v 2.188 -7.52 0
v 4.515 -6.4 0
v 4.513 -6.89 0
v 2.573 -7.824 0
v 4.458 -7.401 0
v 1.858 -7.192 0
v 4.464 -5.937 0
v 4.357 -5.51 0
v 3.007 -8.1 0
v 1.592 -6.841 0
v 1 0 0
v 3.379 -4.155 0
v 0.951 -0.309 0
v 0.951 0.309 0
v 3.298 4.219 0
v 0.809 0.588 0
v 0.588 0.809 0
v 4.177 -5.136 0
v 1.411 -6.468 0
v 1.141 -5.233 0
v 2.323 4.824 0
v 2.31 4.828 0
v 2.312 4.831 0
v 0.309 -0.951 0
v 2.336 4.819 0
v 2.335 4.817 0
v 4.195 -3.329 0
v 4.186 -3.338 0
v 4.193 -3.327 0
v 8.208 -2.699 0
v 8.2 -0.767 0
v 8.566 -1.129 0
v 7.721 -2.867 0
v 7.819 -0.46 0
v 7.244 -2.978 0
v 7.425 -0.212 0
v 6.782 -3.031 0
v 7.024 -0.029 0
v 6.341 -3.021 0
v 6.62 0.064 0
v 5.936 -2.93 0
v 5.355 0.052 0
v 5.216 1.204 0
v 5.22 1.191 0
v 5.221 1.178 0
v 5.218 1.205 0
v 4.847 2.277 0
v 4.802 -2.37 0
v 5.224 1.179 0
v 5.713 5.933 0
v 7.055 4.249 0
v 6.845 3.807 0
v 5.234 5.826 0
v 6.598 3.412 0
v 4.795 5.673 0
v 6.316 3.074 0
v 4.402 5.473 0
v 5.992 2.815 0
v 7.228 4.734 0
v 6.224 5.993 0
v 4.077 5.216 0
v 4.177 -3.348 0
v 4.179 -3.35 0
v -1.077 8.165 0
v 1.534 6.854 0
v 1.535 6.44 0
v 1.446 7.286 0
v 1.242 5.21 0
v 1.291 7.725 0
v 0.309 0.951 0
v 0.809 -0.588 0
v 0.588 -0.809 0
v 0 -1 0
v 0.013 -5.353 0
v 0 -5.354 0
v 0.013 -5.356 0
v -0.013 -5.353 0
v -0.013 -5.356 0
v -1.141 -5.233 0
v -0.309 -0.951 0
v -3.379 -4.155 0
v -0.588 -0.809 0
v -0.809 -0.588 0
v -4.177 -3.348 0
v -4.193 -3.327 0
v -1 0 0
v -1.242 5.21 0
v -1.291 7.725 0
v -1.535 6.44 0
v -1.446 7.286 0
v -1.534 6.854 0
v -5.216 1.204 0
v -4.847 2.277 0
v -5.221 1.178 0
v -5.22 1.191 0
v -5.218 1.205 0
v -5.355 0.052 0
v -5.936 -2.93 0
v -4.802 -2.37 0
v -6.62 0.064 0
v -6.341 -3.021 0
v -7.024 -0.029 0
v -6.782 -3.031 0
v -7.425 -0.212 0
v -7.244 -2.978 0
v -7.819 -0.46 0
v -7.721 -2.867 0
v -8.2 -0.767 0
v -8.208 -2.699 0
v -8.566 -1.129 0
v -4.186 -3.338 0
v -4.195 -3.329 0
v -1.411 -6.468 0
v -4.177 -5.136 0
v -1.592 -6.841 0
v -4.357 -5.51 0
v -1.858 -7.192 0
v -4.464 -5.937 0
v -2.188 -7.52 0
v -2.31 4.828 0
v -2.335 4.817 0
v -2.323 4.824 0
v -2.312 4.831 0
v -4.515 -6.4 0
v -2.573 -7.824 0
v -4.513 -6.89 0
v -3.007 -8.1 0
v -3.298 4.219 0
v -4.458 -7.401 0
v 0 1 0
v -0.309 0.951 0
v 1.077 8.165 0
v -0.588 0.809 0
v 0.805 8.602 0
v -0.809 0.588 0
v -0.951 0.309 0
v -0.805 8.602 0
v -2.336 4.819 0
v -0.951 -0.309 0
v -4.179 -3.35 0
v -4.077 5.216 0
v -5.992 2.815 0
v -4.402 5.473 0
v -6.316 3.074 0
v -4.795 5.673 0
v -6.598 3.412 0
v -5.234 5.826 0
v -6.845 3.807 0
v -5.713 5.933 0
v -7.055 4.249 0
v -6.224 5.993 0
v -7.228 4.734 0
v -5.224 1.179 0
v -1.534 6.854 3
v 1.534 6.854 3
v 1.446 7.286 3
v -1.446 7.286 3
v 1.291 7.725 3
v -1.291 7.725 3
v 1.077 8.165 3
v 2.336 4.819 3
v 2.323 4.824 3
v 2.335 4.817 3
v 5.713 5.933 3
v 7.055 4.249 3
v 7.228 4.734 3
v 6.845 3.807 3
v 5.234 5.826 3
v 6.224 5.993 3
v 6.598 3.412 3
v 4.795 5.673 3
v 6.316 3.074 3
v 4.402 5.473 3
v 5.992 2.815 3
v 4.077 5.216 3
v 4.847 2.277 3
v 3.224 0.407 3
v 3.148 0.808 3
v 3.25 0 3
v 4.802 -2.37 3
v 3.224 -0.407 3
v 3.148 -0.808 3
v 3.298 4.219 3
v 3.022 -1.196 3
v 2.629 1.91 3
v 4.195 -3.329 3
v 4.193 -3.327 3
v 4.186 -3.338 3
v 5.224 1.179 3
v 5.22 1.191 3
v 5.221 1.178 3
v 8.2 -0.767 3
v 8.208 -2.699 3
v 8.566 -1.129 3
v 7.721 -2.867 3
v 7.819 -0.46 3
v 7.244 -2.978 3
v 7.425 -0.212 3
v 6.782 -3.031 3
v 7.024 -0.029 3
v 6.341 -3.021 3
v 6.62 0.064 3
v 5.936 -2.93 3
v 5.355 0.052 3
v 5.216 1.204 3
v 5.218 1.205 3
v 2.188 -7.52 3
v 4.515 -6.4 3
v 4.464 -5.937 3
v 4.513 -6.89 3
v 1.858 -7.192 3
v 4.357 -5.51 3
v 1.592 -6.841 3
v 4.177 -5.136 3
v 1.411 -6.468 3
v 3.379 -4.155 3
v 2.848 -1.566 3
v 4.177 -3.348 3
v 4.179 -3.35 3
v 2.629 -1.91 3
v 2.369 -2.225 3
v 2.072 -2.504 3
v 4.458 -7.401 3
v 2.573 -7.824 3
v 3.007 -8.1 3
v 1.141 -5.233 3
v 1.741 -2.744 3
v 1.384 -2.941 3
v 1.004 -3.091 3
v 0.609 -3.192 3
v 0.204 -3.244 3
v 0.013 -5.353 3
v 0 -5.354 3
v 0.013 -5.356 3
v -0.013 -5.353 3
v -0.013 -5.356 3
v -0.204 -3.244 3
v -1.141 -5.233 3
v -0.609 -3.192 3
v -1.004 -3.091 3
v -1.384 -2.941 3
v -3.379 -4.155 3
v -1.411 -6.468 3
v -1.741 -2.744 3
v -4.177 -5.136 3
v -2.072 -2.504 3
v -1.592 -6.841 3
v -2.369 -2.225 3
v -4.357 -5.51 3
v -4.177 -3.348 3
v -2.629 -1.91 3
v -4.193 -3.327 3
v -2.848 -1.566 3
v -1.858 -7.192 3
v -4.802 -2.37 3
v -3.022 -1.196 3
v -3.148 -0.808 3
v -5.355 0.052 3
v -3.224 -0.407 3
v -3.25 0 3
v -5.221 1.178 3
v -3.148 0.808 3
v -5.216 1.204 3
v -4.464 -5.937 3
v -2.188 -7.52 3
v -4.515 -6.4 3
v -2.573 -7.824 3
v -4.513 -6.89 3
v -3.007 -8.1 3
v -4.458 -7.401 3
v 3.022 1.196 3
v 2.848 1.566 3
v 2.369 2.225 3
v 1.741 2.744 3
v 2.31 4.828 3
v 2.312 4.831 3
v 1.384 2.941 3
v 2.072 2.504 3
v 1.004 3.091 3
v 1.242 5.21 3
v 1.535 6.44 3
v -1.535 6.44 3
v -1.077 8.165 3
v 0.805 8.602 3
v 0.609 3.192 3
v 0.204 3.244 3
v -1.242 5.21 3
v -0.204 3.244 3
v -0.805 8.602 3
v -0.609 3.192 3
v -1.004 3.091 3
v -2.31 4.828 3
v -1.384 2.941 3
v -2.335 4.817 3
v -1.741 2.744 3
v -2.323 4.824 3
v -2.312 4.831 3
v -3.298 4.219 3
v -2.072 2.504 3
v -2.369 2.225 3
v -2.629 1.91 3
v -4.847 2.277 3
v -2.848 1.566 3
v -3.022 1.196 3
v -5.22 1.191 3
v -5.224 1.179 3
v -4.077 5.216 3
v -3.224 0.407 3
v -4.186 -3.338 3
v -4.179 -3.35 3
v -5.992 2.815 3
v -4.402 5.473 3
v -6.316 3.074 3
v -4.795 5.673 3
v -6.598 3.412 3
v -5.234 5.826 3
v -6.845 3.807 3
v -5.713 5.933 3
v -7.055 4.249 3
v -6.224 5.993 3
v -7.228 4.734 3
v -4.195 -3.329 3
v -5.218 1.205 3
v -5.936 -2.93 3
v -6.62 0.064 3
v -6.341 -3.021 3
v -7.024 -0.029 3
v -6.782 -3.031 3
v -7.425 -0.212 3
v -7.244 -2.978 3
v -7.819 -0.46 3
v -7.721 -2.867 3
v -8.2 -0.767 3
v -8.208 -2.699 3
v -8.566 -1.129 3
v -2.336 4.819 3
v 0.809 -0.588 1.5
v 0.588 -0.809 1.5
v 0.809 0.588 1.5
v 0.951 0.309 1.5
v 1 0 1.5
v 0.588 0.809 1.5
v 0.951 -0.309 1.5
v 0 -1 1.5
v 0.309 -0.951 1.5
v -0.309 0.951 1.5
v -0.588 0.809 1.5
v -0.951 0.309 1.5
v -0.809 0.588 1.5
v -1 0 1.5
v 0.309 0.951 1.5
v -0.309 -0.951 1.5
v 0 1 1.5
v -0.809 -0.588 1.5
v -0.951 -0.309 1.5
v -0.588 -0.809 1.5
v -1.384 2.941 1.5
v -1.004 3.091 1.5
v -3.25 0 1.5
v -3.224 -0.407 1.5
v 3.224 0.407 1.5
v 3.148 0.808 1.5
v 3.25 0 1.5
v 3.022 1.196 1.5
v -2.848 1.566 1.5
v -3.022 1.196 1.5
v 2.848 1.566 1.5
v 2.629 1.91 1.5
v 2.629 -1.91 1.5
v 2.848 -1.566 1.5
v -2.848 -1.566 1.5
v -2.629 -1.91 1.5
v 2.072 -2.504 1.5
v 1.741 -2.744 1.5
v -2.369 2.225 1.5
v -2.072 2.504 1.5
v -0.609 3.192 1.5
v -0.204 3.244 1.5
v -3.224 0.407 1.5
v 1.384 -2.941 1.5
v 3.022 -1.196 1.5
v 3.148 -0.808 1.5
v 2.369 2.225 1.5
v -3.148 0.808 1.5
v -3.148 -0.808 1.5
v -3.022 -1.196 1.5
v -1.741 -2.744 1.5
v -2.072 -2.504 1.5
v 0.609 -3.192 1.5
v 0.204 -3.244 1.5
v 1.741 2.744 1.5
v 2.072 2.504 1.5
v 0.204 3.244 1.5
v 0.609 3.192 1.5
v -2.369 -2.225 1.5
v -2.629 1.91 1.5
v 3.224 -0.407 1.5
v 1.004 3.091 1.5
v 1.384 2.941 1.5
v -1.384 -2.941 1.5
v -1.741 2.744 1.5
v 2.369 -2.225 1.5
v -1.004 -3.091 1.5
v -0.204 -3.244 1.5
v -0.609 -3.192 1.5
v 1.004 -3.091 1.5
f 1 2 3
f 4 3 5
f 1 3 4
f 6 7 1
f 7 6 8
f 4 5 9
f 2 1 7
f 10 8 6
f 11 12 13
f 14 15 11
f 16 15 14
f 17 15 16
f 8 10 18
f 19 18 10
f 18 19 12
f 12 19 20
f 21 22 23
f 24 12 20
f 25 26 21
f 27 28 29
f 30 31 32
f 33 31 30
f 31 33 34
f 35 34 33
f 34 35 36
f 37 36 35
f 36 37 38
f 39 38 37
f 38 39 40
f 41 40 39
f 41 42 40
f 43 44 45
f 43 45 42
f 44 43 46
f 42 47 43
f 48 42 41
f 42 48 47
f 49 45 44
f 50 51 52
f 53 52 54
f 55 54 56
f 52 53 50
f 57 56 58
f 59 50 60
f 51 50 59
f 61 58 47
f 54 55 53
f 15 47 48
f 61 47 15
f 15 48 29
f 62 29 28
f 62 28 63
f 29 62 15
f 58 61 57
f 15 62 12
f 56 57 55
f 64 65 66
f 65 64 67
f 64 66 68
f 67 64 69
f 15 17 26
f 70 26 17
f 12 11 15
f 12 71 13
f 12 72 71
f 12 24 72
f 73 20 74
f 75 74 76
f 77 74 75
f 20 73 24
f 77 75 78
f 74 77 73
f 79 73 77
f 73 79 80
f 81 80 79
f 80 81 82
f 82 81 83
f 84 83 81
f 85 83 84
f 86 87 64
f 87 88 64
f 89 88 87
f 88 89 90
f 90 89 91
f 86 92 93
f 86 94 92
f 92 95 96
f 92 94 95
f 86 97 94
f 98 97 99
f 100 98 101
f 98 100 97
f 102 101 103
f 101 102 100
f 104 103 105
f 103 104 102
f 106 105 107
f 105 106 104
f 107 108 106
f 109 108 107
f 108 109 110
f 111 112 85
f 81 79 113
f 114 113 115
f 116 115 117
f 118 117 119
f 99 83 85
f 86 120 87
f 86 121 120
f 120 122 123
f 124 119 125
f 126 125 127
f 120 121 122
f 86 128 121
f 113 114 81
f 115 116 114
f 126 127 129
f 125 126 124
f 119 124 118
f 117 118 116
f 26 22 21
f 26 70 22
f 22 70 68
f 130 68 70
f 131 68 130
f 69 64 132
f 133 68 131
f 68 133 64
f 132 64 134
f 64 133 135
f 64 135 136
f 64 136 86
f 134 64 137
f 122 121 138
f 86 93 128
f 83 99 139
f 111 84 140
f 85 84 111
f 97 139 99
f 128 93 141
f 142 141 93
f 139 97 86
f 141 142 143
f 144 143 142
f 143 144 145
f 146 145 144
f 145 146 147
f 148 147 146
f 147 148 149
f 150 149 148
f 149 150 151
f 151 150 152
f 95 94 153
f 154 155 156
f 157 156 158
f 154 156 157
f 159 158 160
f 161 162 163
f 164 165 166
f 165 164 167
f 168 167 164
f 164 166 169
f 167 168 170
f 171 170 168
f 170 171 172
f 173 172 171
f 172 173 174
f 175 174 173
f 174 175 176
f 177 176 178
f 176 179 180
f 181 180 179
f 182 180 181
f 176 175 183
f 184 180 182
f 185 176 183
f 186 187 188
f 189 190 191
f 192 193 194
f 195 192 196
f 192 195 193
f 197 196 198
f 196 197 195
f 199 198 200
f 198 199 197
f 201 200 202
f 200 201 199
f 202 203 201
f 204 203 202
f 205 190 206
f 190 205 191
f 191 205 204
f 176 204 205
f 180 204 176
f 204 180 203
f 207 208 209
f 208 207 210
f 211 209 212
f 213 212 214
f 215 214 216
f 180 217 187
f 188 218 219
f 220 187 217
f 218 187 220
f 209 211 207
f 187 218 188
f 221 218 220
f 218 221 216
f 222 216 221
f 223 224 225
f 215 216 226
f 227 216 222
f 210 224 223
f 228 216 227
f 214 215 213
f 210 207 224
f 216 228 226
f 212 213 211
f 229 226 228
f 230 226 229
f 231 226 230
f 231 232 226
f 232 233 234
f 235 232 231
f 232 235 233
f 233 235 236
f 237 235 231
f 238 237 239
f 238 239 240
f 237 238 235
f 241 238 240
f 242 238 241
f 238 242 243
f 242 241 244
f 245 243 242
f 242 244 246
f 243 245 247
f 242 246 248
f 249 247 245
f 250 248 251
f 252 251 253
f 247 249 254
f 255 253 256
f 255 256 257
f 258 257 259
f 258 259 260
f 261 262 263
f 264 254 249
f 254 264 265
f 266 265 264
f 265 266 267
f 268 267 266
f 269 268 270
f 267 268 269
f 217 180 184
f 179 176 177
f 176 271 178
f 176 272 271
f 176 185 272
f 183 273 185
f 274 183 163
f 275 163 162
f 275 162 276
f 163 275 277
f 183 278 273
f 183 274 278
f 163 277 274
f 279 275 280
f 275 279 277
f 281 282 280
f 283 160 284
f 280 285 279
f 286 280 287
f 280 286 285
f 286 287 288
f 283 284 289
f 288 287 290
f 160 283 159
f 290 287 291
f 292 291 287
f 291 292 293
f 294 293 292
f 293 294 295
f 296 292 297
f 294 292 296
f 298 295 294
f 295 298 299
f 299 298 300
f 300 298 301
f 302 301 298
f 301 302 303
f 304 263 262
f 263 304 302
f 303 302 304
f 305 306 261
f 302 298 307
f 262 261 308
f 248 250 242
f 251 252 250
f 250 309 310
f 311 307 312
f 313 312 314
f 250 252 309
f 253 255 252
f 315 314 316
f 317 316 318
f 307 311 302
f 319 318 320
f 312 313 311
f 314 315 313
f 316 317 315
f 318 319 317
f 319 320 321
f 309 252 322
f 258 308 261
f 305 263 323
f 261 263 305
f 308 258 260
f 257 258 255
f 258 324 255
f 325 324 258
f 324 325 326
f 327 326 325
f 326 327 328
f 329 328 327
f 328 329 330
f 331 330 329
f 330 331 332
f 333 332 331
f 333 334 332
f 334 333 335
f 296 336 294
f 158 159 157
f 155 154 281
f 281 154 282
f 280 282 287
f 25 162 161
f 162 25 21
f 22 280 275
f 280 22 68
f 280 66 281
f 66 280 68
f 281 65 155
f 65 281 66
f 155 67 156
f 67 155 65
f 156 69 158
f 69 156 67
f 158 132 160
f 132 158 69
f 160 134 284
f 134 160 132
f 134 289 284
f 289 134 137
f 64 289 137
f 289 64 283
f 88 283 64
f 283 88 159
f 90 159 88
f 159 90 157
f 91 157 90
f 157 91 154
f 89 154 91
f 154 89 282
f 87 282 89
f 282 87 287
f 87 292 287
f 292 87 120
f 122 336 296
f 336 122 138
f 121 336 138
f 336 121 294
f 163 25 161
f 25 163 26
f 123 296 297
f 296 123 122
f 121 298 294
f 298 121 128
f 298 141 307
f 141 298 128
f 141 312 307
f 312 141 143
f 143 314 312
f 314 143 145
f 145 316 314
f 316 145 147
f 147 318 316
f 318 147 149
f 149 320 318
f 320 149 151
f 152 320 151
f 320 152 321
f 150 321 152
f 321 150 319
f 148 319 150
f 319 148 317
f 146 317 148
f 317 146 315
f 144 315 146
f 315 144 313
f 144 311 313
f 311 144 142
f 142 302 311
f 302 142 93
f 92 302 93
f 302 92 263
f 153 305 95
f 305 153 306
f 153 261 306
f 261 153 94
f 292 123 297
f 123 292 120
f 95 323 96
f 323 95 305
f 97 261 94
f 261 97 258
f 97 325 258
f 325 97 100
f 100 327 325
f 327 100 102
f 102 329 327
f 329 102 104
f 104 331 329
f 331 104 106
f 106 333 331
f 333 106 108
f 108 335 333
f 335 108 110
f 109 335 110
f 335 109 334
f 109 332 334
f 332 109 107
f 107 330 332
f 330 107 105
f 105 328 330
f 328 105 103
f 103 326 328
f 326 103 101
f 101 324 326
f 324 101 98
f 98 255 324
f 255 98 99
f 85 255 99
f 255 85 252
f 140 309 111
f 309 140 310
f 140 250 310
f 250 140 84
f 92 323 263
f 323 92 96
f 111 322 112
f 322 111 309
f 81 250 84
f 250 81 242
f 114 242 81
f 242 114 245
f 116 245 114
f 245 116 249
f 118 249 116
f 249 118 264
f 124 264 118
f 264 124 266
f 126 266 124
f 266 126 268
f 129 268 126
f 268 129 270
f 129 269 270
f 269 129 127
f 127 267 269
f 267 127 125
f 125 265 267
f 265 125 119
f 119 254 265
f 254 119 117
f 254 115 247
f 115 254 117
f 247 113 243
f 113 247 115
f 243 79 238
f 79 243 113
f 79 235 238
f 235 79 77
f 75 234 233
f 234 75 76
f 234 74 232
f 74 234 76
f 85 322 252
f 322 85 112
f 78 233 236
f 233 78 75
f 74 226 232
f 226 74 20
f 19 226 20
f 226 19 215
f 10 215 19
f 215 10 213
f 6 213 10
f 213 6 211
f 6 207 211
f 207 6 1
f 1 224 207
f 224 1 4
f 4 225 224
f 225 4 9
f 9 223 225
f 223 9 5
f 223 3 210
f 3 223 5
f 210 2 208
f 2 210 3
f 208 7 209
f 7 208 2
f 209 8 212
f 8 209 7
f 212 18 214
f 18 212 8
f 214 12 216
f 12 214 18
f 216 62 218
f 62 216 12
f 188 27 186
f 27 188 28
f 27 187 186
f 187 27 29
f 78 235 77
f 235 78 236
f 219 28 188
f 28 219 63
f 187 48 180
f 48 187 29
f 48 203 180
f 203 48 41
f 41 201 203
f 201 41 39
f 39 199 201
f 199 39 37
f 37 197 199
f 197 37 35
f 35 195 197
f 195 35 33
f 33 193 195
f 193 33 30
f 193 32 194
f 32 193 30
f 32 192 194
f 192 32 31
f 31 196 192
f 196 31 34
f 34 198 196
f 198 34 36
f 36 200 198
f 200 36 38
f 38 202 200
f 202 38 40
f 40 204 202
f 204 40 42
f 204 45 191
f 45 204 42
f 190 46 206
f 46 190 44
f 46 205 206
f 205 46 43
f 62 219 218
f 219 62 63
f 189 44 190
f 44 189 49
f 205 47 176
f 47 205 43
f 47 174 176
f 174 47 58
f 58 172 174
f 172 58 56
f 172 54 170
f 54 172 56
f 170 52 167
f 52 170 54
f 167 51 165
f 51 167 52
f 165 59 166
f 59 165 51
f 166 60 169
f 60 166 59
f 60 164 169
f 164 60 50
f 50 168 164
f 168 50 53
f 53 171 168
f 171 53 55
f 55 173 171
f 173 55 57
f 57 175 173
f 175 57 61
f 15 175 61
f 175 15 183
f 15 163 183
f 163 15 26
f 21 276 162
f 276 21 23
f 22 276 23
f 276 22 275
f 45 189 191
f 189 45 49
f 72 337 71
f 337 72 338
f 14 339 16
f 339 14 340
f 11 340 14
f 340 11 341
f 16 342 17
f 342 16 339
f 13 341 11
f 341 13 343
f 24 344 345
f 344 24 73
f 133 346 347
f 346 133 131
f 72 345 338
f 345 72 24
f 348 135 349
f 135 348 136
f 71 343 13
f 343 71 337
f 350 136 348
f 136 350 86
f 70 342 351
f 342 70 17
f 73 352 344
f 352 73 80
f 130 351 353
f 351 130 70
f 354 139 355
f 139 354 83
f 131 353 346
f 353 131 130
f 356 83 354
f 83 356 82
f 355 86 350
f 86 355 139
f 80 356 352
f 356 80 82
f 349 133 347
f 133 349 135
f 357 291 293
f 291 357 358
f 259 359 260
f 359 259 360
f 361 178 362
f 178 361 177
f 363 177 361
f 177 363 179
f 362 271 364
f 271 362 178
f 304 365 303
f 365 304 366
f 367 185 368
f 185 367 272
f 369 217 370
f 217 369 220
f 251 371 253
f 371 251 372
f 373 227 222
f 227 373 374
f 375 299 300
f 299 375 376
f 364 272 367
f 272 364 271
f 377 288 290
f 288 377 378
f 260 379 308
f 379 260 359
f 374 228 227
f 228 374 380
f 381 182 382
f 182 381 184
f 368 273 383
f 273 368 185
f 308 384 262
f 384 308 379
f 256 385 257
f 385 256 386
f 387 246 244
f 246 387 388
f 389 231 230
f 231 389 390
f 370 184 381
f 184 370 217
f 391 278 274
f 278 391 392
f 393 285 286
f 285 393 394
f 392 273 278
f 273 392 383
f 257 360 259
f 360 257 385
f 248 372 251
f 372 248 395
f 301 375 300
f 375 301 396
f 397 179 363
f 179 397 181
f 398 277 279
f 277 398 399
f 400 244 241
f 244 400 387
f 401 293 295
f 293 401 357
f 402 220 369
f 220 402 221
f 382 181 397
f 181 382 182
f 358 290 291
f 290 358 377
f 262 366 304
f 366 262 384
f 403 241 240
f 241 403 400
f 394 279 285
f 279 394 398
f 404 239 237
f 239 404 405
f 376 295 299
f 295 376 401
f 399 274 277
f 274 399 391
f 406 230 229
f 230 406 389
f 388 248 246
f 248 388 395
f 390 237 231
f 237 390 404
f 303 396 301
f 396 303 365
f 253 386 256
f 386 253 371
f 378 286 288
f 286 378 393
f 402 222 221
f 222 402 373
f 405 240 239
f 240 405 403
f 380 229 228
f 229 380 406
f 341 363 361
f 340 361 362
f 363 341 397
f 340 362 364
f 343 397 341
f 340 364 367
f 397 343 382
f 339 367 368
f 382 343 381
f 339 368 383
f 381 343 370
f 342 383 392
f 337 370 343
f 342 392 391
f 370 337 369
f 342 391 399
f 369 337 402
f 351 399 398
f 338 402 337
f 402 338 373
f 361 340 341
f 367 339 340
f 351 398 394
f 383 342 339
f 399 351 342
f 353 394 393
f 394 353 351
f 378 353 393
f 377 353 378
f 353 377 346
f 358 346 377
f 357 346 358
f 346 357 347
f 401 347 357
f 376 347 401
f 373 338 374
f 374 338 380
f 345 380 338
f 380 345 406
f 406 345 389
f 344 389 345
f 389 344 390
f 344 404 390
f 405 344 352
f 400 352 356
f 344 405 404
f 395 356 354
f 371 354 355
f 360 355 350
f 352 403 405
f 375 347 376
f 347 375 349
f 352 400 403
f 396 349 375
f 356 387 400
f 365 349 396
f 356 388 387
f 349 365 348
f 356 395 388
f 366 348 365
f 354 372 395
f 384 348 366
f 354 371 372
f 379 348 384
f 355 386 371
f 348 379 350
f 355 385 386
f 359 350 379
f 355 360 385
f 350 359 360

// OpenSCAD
//////////////////////////////////////////////////////////////////////////////////////////////
// Public Domain Parametric Involute Spur Gear (and involute helical gear and involute rack)
// version 1.1
// by Leemon Baird, 2011, Leemon@Leemon.com
//http://www.thingiverse.com/thing:5505
//
// This file is public domain.  Use it for any purpose, including commercial
// applications.  Attribution would be nice, but is not required.  There is
// no warranty of any kind, including its correctness, usefulness, or safety.
// 
// This is parameterized involute spur (or helical) gear.  It is much simpler and less powerful than
// others on Thingiverse.  But it is public domain.  I implemented it from scratch from the 
// descriptions and equations on Wikipedia and the web, using Mathematica for calculations and testing,
// and I now release it into the public domain.
//
//		http://en.wikipedia.org/wiki/Involute_gear
//		http://en.wikipedia.org/wiki/Gear
//		http://en.wikipedia.org/wiki/List_of_gear_nomenclature
//		http://gtrebaol.free.fr/doc/catia/spur_gear.html
//		http://www.cs.cmu.edu/~rapidproto/mechanisms/chpt7.html
//
// The module gear() gives an involute spur gear, with reasonable defaults for all the parameters.
// Normally, you should just choose the first 4 parameters, and let the rest be default values.
// The module gear() gives a gear in the XY plane, centered on the origin, with one tooth centered on
// the positive Y axis.  The various functions below it take the same parameters, and return various
// measurements for the gear.  The most important is pitch_radius, which tells how far apart to space
// gears that are meshing, and adendum_radius, which gives the size of the region filled by the gear.
// A gear has a "pitch circle", which is an invisible circle that cuts through the middle of each
// tooth (though not the exact center). In order for two gears to mesh, their pitch circles should 
// just touch.  So the distance between their centers should be pitch_radius() for one, plus pitch_radius() 
// for the other, which gives the radii of their pitch circles.
//
// In order for two gears to mesh, they must have the same mm_per_tooth and pressure_angle parameters.  
// mm_per_tooth gives the number of millimeters of arc around the pitch circle covered by one tooth and one
// space between teeth.  The pitch angle controls how flat or bulged the sides of the teeth are.  Common
// values include 14.5 degrees and 20 degrees, and occasionally 25.  Though I've seen 28 recommended for
// plastic gears. Larger numbers bulge out more, giving stronger teeth, so 28 degrees is the default here.
//
// The ratio of number_of_teeth for two meshing gears gives how many times one will make a full 
// revolution when the the other makes one full revolution.  If the two numbers are coprime (i.e. 
// are not both divisible by the same number greater than 1), then every tooth on one gear
// will meet every tooth on the other, for more even wear.  So coprime numbers of teeth are good.
//
// The module rack() gives a rack, which is a bar with teeth.  A rack can mesh with any
// gear that has the same mm_per_tooth and pressure_angle.
//
// Some terminology: 
// The outline of a gear is a smooth circle (the "pitch circle") which has mountains and valleys
// added so it is toothed.  So there is an inner circle (the "root circle") that touches the 
// base of all the teeth, an outer circle that touches the tips of all the teeth,
// and the invisible pitch circle in between them.  There is also a "base circle", which can be smaller than
// all three of the others, which controls the shape of the teeth.  The side of each tooth lies on the path 
// that the end of a string would follow if it were wrapped tightly around the base circle, then slowly unwound.  
// That shape is an "involute", which gives this type of gear its name.
//
//////////////////////////////////////////////////////////////////////////////////////////////

translate([0,0,1.5])

difference(){
	gear();
	cylinder (r=6.5/2, h=1.5, $fn=50);
}

	


//An involute spur gear, with reasonable defaults for all the parameters.
//Normally, you should just choose the first 4 parameters, and let the rest be default values.
//Meshing gears must match in mm_per_tooth, pressure_angle, and twist,
//and be separated by the sum of their pitch radii, which can be found with pitch_radius().
module gear (
	mm_per_tooth    = 6.73,    //this is the "circular pitch", the circumference of the pitch circle divided by the number of teeth
	number_of_teeth = 7,   //total number of teeth around the entire perimeter
	thickness       = 3,    //thickness of gear in mm
	hole_diameter   = 2,    //diameter of the hole in the center, in mm
	twist           = 0,    //teeth rotate this many degrees from bottom of gear to top.  360 makes the gear a screw with each thread going around once
	teeth_to_hide   = 0,    //number of teeth to delete to make this only a fraction of a circle
	pressure_angle  = 28,   //Controls how straight or bulged the tooth sides are. In degrees.
	clearance       = 1,  //gap between top of a tooth on one gear and bottom of valley on a meshing gear (in millimeters)
	backlash        = 1   //gap between two meshing teeth, in the direction along the circumference of the pitch circle
) {
	assign(pi = 3.1415926)
	assign(p  = mm_per_tooth * number_of_teeth / pi / 2)  //radius of pitch circle
	assign(c  = p + mm_per_tooth / pi - clearance)        //radius of outer circle
	assign(b  = p*cos(pressure_angle))                    //radius of base circle
	assign(r  = p-(c-p)-clearance)                        //radius of root circle
	assign(t  = mm_per_tooth/2-backlash/2)                //tooth thickness at pitch circle
	assign(k  = -iang(b, p) - t/2/p/pi*180) {             //angle to where involute meets base circle on each side of tooth
		difference() {
			for (i = [0:number_of_teeth-teeth_to_hide-1] )
				rotate([0,0,i*360/number_of_teeth])
					linear_extrude(height = thickness, center = true, convexity = 10, twist = twist)
						polygon(
							points=[
								[0, -hole_diameter/10],
								polar(r, -181/number_of_teeth),
								polar(r, r<b ? k : -180/number_of_teeth),
								q7(0/5,r,b,c,k, 1),q7(1/5,r,b,c,k, 1),q7(2/5,r,b,c,k, 1),q7(3/5,r,b,c,k, 1),q7(4/5,r,b,c,k, 1),q7(5/5,r,b,c,k, 1),
								q7(5/5,r,b,c,k,-1),q7(4/5,r,b,c,k,-1),q7(3/5,r,b,c,k,-1),q7(2/5,r,b,c,k,-1),q7(1/5,r,b,c,k,-1),q7(0/5,r,b,c,k,-1),
								polar(r, r<b ? -k : 180/number_of_teeth),
								polar(r, 181/number_of_teeth)
							],
 							paths=[[0,1,2,3,4,5,6,7,8,9,10,11,12,13,14,15,16]]
						);
			cylinder(h=2*thickness+1, r=hole_diameter/2, center=true, $fn=20);
		}
	}
};	
//these 4 functions are used by gear
function polar(r,theta)   = r*[sin(theta), cos(theta)];                            //convert polar to cartesian coordinates
function iang(r1,r2)      = sqrt((r2/r1)*(r2/r1) - 1)/3.1415926*180 - acos(r1/r2); //unwind a string this many degrees to go from radius r1 to radius r2
function q7(f,r,b,r2,t,s) = q6(b,s,t,(1-f)*max(b,r)+f*r2);                         //radius a fraction f up the curved side of the tooth 
function q6(b,s,t,d)      = polar(d,s*(iang(b,d)+t));                              //point at radius d on the involute curve

//a rack, which is a straight line with teeth (the same as a segment from a giant gear with a huge number of teeth).
//The "pitch circle" is a line along the X axis.
module rack (
	mm_per_tooth    = 3,    //this is the "circular pitch", the circumference of the pitch circle divided by the number of teeth
	number_of_teeth = 11,   //total number of teeth along the rack
	thickness       = 6,    //thickness of rack in mm (affects each tooth)
	height          = 120,   //height of rack in mm, from tooth top to far side of rack.
	pressure_angle  = 28,   //Controls how straight or bulged the tooth sides are. In degrees.
	backlash        = 0.0   //gap between two meshing teeth, in the direction along the circumference of the pitch circle
) {
	assign(pi = 3.1415926)
	assign(a = mm_per_tooth / pi) //addendum
	assign(t = a*cos(pressure_angle)-1)         //tooth side is tilted so top/bottom corners move this amount
		for (i = [0:number_of_teeth-1] )
			translate([i*mm_per_tooth,0,0])
				linear_extrude(height = thickness, center = true, convexity = 10)
					polygon(
						points=[
							[-mm_per_tooth * 3/4,                 a-height],
							[-mm_per_tooth * 3/4 - backlash,     -a],
							[-mm_per_tooth * 1/4 + backlash - t, -a],
							[-mm_per_tooth * 1/4 + backlash + t,  a],
							[ mm_per_tooth * 1/4 - backlash - t,  a],
							[ mm_per_tooth * 1/4 - backlash + t, -a],
							[ mm_per_tooth * 3/4 + backlash,     -a],
							[ mm_per_tooth * 3/4,                 a-height],
						],
						paths=[[0,1,2,3,4,5,6,7]]
					);
};	

//These 5 functions let the user find the derived dimensions of the gear.
//A gear fits within a circle of radius outer_radius, and two gears should have
//their centers separated by the sum of their pictch_radius.
function circular_pitch  (mm_per_tooth=3) = mm_per_tooth;                     //tooth density expressed as "circular pitch" in millimeters
function diametral_pitch (mm_per_tooth=3) = 3.1415926 / mm_per_tooth;         //tooth density expressed as "diametral pitch" in teeth per millimeter
function module_value    (mm_per_tooth=3) = mm_per_tooth / pi;                //tooth density expressed as "module" or "modulus" in millimeters
function pitch_radius    (mm_per_tooth=3,number_of_teeth=11) = mm_per_tooth * number_of_teeth / 3.1415926 / 2;
function outer_radius    (mm_per_tooth=3,number_of_teeth=11,clearance=0.1)    //The gear fits entirely within a cylinder of this radius.
	= mm_per_tooth*(1+number_of_teeth/2)/3.1415926  - clearance;              

/////////////////////////////////////////////////////////////////////////////////////////////
//example gear train.  
//Try it with OpenSCAD View/Animate command with 20 steps and 24 FPS.
//The gears will continue to be rotated to mesh correctly if you change the number of teeth.

//n1 = 11; //red gear number of teeth
//n2 = 20; //green gear
//n3 = 5;  //blue gear
//n4 = 20; //orange gear
//n5 = 8;  //gray rack
//mm_per_tooth = 9; //all meshing gears need the same mm_per_tooth (and the same pressure_angle)
//thickness    = 6;
//hole         = 3;
//height       = 12;
//
//d1 =pitch_radius(mm_per_tooth,n1);
//d12=pitch_radius(mm_per_tooth,n1) + pitch_radius(mm_per_tooth,n2);
//d13=pitch_radius(mm_per_tooth,n1) + pitch_radius(mm_per_tooth,n3);
//d14=pitch_radius(mm_per_tooth,n1) + pitch_radius(mm_per_tooth,n4);
//
//translate([ 0,    0, 0]) rotate([0,0, $t*360/n1])                 color([1.00,0.75,0.75]) gear(mm_per_tooth,n1,thickness,hole);
//translate([ 0,  d12, 0]) rotate([0,0,-($t+n2/2-0*n1+1/2)*360/n2]) color([0.75,1.00,0.75]) gear(mm_per_tooth,n2,thickness,hole,0,108);
//translate([ d13,  0, 0]) rotate([0,0,-($t-n3/4+n1/4+1/2)*360/n3]) color([0.75,0.75,1.00]) gear(mm_per_tooth,n3,thickness,hole);
//translate([ d13,  0, 0]) rotate([0,0,-($t-n3/4+n1/4+1/2)*360/n3]) color([0.75,0.75,1.00]) gear(mm_per_tooth,n3,thickness,hole);
//translate([-d14,  0, 0]) rotate([0,0,-($t-n4/4-n1/4+1/2-floor(n4/4)-3)*360/n4]) color([1.00,0.75,0.50]) gear(mm_per_tooth,n4,thickness,hole,0,n4-3);
//translate([(-floor(n5/2)-floor(n1/2)+$t+n1/2-1/2)*9, -d1+0.0, 0]) rotate([0,0,0]) color([0.75,0.75,0.75]) rack(mm_per_tooth,n5,thickness,height);
